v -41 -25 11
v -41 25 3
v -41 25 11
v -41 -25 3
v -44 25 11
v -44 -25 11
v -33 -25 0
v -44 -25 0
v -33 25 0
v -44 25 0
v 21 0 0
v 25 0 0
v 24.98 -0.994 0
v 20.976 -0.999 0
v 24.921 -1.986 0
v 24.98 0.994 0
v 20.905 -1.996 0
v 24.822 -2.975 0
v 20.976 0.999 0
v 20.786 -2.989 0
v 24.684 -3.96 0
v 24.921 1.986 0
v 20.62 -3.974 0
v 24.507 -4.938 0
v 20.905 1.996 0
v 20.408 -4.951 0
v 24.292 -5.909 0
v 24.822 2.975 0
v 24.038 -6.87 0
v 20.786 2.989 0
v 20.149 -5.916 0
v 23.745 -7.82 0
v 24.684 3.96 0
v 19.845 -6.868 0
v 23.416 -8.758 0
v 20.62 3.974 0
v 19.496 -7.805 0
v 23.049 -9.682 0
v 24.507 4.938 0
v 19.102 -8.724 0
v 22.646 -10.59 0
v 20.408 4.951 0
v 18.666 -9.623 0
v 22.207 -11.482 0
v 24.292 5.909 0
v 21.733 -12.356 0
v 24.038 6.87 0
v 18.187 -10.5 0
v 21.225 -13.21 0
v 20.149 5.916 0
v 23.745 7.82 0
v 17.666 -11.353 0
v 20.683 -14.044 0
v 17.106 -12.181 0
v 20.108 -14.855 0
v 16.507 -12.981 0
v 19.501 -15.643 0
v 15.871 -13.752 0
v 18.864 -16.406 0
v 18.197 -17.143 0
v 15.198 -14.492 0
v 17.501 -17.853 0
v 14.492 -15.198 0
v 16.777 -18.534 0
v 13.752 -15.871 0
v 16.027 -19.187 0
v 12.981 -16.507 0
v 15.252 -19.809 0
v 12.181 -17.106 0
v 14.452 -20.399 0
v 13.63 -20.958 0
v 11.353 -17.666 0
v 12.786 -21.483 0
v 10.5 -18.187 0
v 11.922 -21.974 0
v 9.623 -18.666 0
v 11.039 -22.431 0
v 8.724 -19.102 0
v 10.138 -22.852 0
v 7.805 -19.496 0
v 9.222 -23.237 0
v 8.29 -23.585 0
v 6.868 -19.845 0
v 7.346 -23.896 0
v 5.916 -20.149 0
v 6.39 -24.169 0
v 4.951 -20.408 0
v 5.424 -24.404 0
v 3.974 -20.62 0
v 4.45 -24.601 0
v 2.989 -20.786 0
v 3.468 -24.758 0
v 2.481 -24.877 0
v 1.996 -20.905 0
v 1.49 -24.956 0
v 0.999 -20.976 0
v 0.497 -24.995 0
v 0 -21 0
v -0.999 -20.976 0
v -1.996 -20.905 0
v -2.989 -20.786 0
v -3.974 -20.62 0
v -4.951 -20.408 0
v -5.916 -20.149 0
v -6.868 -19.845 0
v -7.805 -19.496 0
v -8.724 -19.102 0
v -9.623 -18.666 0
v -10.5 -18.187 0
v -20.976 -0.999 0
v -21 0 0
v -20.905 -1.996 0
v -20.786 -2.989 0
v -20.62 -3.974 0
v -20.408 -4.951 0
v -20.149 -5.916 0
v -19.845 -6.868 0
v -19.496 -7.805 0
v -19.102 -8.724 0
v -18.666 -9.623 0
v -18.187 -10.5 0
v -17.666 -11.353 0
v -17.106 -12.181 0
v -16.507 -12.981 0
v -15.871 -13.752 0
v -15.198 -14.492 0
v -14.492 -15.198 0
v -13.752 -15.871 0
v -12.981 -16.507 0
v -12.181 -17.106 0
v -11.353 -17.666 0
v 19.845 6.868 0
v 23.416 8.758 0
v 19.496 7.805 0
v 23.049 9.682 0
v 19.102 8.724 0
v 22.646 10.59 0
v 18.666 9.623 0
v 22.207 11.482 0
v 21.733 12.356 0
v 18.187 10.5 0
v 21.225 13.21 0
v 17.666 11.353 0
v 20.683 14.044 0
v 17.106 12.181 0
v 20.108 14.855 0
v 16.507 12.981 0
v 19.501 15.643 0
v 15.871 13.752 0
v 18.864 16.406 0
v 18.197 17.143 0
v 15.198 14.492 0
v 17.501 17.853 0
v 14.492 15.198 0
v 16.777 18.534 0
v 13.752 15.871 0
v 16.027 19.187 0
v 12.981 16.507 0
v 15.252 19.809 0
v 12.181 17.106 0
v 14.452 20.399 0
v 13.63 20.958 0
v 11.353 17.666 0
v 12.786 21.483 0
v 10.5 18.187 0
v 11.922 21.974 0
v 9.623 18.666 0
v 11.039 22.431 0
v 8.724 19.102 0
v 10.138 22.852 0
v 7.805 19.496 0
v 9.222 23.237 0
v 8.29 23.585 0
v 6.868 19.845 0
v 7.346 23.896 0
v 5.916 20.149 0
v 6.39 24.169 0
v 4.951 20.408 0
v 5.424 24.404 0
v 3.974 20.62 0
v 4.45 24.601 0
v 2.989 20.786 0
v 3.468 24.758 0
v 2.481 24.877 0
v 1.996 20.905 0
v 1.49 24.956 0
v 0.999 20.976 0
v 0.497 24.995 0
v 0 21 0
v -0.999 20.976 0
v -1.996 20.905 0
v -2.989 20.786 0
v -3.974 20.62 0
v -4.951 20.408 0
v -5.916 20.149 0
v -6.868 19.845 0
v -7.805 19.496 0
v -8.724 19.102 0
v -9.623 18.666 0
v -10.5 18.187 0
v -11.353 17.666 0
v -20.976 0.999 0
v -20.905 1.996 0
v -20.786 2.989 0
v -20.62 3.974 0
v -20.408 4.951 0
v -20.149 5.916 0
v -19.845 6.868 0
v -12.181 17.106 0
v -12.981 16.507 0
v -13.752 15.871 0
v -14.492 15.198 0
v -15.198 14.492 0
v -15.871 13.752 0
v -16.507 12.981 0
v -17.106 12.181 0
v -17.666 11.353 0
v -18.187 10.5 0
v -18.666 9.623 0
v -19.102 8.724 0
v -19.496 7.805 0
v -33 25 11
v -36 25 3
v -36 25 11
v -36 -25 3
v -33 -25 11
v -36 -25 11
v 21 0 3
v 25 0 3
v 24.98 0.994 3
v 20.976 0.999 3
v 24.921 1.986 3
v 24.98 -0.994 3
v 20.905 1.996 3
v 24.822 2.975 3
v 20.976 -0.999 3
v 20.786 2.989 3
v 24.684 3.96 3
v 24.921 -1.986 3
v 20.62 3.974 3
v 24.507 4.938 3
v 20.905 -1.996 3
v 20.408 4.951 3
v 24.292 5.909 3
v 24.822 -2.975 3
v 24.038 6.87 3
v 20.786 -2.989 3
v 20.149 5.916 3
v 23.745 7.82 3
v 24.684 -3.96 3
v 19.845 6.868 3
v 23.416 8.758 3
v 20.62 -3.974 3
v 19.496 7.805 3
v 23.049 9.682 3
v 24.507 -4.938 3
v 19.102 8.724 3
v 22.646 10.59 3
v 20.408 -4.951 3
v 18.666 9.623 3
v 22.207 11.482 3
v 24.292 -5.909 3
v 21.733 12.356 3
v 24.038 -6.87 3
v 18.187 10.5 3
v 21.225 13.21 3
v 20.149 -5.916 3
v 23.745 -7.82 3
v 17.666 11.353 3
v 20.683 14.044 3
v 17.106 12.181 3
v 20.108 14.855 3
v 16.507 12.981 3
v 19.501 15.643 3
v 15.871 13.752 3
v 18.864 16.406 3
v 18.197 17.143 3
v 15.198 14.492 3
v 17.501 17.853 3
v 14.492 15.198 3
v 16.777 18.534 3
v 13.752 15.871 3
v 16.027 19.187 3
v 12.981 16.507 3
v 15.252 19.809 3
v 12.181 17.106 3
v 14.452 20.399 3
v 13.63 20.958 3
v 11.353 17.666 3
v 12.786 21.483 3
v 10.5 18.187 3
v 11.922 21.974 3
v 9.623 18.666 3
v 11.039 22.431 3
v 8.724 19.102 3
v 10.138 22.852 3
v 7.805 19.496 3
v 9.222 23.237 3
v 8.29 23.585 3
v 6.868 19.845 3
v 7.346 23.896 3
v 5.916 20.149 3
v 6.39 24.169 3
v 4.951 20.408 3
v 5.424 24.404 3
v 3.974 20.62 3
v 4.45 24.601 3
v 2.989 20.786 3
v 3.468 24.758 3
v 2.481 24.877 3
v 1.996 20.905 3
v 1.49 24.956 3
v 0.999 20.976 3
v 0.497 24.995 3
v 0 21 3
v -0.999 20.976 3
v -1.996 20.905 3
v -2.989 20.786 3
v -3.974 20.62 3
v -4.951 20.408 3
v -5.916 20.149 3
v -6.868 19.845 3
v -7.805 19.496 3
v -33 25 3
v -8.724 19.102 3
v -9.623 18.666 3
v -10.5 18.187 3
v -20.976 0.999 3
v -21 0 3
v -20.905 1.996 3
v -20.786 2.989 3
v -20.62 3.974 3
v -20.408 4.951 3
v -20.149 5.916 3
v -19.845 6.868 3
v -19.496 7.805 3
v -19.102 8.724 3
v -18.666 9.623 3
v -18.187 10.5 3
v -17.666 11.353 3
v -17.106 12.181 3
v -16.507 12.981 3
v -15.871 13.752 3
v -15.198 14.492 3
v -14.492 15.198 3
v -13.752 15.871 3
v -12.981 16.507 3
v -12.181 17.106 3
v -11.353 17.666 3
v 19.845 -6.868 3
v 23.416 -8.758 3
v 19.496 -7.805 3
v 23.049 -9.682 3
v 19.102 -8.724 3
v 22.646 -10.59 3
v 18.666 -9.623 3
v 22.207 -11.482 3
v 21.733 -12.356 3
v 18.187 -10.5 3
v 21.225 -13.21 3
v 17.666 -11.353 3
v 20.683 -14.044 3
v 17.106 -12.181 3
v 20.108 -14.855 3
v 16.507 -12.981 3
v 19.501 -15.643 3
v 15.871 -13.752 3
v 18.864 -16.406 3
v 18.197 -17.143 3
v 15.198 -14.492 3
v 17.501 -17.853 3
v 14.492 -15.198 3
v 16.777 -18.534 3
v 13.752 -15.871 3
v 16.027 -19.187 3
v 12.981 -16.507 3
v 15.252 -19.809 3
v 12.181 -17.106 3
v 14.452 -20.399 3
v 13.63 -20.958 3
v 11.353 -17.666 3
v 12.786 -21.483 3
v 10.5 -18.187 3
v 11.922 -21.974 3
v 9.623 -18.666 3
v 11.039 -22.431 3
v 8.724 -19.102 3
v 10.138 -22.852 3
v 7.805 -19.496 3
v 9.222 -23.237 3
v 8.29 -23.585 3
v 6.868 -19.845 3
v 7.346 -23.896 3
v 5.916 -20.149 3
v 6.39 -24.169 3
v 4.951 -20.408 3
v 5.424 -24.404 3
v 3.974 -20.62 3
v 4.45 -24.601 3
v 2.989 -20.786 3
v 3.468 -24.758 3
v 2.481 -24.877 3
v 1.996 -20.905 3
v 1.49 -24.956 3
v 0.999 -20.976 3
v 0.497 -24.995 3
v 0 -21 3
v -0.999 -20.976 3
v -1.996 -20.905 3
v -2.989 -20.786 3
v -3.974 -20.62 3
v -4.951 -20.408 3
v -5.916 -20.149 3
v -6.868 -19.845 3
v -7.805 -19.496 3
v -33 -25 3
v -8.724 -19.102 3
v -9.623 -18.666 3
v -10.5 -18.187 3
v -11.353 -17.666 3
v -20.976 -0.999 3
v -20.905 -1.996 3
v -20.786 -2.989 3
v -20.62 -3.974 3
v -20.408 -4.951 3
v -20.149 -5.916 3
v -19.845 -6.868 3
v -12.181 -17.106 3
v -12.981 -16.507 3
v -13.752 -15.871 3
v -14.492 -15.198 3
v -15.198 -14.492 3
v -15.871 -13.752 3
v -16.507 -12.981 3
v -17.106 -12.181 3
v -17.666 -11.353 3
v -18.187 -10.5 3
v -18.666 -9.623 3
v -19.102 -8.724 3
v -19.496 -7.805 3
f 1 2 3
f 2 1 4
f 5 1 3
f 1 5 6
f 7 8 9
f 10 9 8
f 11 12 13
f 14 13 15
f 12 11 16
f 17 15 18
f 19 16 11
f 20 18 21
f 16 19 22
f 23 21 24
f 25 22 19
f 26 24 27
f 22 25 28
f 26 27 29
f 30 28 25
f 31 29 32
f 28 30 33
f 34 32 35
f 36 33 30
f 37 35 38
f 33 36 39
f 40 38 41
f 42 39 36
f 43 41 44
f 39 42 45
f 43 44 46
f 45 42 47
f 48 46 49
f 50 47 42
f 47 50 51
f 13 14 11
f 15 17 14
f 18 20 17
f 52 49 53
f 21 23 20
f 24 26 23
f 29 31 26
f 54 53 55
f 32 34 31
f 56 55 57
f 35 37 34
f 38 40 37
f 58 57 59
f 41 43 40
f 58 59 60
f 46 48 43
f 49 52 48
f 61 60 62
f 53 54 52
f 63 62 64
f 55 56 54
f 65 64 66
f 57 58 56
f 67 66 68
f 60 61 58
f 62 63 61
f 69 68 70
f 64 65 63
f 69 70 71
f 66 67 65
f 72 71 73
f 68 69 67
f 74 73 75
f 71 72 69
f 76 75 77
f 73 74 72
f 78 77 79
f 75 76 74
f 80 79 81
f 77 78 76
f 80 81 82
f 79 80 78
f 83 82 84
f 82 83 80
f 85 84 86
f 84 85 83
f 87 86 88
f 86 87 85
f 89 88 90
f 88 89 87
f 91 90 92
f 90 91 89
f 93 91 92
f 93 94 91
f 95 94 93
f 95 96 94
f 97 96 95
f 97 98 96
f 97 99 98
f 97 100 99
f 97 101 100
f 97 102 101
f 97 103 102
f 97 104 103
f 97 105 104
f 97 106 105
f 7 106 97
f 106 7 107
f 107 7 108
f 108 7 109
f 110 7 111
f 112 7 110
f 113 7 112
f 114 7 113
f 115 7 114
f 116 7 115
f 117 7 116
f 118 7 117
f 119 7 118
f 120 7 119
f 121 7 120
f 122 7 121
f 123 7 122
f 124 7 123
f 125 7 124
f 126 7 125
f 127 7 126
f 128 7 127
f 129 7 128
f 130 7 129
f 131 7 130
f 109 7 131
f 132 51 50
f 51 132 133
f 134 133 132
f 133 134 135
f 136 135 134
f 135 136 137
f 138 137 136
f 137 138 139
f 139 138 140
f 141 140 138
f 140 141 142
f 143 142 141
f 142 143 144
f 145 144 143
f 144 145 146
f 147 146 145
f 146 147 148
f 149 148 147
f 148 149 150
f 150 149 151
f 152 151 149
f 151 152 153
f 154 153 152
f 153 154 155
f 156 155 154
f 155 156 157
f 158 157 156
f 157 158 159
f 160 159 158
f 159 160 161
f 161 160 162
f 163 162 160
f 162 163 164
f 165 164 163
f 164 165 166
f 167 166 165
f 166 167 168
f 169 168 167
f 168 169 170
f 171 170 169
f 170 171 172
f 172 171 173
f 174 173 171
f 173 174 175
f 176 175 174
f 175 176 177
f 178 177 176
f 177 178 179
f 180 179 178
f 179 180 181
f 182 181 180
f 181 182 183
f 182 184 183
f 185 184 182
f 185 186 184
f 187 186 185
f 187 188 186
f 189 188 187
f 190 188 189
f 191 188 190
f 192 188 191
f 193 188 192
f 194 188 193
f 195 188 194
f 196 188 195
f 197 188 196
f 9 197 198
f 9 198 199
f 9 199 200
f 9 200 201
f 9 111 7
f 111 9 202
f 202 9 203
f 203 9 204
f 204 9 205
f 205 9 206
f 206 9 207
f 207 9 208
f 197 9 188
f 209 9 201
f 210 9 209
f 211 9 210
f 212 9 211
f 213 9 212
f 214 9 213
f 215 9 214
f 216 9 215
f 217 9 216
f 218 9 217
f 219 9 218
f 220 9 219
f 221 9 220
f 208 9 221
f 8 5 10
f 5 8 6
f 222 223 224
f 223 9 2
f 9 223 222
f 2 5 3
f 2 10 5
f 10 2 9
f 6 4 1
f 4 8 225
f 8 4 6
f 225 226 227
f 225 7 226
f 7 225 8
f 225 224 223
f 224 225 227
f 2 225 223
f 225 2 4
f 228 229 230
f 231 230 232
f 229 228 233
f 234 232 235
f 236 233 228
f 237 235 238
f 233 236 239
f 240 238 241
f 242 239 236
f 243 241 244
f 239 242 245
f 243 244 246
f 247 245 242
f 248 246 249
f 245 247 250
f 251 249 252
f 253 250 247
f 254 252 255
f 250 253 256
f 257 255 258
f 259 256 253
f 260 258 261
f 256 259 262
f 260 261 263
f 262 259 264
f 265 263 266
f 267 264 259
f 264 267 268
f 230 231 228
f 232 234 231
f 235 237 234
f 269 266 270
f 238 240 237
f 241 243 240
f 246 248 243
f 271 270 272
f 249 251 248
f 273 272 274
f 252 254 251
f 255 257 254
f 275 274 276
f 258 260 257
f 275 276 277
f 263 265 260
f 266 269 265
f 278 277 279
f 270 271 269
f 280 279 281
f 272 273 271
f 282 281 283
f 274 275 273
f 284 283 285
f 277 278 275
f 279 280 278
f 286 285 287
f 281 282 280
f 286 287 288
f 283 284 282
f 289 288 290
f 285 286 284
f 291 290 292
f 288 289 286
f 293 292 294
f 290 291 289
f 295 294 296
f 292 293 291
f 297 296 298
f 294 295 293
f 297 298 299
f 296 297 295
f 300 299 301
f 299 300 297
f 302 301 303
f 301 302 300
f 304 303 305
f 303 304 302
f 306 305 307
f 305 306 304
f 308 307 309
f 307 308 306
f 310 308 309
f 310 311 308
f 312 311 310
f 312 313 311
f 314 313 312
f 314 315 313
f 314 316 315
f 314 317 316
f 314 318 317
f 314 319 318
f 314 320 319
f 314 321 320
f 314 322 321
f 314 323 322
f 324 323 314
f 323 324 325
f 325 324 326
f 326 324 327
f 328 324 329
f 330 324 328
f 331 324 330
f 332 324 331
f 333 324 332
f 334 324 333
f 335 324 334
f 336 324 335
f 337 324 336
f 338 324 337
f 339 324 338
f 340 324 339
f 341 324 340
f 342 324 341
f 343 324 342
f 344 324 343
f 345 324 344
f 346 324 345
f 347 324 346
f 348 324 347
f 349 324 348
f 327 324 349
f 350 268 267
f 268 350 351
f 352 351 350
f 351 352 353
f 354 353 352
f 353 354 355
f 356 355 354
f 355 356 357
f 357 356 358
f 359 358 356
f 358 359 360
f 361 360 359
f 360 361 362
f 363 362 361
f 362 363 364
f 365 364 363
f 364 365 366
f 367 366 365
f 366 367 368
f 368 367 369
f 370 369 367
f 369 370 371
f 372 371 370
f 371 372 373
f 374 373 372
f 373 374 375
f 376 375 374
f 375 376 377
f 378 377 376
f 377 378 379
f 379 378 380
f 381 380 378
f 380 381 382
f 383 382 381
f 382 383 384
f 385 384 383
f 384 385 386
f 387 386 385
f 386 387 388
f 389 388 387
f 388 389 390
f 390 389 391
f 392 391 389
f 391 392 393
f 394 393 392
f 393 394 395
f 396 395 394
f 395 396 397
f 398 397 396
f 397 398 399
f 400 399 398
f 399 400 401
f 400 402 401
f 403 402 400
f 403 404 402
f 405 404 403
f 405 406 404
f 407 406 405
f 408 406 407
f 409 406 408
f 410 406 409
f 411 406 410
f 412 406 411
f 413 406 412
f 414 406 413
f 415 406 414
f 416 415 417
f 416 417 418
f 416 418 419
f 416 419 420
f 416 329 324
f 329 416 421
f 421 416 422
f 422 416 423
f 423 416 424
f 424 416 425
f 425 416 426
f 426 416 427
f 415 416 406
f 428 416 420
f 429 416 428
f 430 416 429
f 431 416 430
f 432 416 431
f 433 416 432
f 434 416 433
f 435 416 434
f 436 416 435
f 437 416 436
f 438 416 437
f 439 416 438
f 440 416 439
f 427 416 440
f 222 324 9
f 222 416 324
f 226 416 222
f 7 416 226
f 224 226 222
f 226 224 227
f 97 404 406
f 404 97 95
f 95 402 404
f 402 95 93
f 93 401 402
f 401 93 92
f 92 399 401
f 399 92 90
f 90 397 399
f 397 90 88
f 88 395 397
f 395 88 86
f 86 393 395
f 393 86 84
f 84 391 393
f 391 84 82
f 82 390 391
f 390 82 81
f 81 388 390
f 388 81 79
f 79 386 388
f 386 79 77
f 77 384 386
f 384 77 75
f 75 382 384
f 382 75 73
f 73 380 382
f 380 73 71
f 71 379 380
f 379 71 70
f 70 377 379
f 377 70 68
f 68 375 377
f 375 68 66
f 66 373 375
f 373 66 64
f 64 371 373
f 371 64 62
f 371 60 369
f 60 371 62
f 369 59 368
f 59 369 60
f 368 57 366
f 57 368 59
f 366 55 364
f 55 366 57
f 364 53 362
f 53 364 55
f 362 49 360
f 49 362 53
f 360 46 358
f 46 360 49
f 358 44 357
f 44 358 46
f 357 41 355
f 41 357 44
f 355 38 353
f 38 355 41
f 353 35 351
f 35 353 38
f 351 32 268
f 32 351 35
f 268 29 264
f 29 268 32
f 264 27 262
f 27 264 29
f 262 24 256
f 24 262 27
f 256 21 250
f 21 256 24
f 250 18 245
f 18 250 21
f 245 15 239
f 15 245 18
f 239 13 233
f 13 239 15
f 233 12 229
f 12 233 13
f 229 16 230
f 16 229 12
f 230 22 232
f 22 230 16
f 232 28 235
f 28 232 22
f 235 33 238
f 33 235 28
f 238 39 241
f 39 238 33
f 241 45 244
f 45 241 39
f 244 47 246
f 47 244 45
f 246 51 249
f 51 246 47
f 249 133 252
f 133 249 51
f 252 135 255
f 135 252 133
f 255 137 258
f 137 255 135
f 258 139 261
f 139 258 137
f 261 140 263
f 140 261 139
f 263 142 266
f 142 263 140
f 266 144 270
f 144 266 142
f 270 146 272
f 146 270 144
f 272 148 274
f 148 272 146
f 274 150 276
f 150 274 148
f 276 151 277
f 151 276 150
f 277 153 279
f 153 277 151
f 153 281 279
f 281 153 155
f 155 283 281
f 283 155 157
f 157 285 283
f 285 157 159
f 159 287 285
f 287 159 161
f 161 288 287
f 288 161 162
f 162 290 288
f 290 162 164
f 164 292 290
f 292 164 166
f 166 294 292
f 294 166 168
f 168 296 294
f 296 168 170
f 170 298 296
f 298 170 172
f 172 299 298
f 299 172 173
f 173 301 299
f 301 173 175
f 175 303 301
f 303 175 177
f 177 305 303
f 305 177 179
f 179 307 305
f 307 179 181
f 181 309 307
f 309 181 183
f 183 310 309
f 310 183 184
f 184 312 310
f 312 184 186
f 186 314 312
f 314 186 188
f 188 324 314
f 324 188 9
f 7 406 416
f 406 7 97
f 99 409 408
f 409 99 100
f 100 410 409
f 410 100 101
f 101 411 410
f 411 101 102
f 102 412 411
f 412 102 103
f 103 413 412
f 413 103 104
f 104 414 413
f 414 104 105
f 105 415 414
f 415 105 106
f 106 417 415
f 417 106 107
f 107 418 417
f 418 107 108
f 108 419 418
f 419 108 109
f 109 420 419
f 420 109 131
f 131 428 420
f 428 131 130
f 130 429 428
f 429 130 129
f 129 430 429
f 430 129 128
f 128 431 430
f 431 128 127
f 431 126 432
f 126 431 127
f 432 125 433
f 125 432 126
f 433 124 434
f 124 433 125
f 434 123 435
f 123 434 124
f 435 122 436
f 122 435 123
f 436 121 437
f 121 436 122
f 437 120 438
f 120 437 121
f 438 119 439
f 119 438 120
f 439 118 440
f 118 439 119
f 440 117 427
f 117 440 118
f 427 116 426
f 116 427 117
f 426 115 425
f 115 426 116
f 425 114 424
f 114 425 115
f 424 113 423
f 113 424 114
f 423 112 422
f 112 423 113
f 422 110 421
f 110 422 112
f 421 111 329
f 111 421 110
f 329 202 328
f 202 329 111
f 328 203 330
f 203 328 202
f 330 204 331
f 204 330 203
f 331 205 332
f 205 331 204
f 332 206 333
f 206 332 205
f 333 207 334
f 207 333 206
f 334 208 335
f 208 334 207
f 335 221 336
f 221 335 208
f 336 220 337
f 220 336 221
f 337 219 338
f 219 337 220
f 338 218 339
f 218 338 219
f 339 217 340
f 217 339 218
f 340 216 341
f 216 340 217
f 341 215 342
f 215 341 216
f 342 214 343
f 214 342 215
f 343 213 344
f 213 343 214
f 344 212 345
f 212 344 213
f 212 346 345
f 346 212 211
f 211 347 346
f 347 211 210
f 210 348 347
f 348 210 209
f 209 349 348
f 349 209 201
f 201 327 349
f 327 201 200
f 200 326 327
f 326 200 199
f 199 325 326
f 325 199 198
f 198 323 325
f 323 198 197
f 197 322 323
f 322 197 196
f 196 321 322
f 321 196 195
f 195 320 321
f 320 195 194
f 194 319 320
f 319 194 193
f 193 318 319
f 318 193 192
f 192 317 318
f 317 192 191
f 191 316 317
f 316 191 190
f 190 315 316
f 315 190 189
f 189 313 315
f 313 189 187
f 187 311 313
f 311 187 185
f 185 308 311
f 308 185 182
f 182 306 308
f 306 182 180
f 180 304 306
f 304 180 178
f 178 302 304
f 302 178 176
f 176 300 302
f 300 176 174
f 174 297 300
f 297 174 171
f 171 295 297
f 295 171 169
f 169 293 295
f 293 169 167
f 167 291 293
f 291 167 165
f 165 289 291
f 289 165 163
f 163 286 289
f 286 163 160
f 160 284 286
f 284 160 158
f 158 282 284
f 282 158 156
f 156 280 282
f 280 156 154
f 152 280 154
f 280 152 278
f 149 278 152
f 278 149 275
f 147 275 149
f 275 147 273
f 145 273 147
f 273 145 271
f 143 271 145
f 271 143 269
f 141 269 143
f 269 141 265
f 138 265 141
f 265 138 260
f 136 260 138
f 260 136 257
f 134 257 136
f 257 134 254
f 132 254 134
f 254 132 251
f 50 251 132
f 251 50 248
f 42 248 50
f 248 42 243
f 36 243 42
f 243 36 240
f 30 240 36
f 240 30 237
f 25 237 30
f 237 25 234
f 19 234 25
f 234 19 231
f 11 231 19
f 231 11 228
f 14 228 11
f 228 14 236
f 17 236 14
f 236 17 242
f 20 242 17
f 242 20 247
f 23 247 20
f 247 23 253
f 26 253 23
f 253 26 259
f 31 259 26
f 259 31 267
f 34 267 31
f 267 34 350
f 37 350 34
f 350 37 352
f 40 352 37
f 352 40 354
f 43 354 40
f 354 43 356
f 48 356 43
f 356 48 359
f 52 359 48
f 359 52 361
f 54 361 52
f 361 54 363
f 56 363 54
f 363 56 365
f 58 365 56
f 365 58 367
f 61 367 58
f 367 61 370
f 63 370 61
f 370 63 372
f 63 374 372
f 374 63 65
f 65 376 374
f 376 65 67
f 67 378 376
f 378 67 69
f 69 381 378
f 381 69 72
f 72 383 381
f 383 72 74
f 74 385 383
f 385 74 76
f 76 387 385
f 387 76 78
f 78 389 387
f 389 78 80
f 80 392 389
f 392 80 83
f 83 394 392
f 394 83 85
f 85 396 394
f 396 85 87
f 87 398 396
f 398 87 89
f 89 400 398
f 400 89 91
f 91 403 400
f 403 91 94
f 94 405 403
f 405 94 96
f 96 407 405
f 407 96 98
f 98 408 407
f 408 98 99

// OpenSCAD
neckDiameter = 42;
neckThickness = 4;
printThickness = 3;

wallSeparation = 15;

gripHeight = 8 + printThickness;
gripThickness = 5;

totalDepth = neckDiameter + 2 * neckThickness;
leftEnd = -(wallSeparation + neckDiameter / 2);

$fa = 1;
$fs = 1;

linear_extrude(printThickness)
difference() {
    hull() {
        translate([leftEnd, 0, 0])
        square([1, totalDepth], center = true);
        
        circle(d = totalDepth);
    }
    circle(d = neckDiameter);
}

translate([-wallSeparation - neckDiameter / 2, -totalDepth / 2, 0]) {
    cube([printThickness, totalDepth, gripHeight]);
    
    translate([-gripThickness - printThickness, 0 , 0]) {
        cube([printThickness, totalDepth, gripHeight]);
        cube([gripThickness + printThickness, totalDepth, printThickness]);
    }
}
